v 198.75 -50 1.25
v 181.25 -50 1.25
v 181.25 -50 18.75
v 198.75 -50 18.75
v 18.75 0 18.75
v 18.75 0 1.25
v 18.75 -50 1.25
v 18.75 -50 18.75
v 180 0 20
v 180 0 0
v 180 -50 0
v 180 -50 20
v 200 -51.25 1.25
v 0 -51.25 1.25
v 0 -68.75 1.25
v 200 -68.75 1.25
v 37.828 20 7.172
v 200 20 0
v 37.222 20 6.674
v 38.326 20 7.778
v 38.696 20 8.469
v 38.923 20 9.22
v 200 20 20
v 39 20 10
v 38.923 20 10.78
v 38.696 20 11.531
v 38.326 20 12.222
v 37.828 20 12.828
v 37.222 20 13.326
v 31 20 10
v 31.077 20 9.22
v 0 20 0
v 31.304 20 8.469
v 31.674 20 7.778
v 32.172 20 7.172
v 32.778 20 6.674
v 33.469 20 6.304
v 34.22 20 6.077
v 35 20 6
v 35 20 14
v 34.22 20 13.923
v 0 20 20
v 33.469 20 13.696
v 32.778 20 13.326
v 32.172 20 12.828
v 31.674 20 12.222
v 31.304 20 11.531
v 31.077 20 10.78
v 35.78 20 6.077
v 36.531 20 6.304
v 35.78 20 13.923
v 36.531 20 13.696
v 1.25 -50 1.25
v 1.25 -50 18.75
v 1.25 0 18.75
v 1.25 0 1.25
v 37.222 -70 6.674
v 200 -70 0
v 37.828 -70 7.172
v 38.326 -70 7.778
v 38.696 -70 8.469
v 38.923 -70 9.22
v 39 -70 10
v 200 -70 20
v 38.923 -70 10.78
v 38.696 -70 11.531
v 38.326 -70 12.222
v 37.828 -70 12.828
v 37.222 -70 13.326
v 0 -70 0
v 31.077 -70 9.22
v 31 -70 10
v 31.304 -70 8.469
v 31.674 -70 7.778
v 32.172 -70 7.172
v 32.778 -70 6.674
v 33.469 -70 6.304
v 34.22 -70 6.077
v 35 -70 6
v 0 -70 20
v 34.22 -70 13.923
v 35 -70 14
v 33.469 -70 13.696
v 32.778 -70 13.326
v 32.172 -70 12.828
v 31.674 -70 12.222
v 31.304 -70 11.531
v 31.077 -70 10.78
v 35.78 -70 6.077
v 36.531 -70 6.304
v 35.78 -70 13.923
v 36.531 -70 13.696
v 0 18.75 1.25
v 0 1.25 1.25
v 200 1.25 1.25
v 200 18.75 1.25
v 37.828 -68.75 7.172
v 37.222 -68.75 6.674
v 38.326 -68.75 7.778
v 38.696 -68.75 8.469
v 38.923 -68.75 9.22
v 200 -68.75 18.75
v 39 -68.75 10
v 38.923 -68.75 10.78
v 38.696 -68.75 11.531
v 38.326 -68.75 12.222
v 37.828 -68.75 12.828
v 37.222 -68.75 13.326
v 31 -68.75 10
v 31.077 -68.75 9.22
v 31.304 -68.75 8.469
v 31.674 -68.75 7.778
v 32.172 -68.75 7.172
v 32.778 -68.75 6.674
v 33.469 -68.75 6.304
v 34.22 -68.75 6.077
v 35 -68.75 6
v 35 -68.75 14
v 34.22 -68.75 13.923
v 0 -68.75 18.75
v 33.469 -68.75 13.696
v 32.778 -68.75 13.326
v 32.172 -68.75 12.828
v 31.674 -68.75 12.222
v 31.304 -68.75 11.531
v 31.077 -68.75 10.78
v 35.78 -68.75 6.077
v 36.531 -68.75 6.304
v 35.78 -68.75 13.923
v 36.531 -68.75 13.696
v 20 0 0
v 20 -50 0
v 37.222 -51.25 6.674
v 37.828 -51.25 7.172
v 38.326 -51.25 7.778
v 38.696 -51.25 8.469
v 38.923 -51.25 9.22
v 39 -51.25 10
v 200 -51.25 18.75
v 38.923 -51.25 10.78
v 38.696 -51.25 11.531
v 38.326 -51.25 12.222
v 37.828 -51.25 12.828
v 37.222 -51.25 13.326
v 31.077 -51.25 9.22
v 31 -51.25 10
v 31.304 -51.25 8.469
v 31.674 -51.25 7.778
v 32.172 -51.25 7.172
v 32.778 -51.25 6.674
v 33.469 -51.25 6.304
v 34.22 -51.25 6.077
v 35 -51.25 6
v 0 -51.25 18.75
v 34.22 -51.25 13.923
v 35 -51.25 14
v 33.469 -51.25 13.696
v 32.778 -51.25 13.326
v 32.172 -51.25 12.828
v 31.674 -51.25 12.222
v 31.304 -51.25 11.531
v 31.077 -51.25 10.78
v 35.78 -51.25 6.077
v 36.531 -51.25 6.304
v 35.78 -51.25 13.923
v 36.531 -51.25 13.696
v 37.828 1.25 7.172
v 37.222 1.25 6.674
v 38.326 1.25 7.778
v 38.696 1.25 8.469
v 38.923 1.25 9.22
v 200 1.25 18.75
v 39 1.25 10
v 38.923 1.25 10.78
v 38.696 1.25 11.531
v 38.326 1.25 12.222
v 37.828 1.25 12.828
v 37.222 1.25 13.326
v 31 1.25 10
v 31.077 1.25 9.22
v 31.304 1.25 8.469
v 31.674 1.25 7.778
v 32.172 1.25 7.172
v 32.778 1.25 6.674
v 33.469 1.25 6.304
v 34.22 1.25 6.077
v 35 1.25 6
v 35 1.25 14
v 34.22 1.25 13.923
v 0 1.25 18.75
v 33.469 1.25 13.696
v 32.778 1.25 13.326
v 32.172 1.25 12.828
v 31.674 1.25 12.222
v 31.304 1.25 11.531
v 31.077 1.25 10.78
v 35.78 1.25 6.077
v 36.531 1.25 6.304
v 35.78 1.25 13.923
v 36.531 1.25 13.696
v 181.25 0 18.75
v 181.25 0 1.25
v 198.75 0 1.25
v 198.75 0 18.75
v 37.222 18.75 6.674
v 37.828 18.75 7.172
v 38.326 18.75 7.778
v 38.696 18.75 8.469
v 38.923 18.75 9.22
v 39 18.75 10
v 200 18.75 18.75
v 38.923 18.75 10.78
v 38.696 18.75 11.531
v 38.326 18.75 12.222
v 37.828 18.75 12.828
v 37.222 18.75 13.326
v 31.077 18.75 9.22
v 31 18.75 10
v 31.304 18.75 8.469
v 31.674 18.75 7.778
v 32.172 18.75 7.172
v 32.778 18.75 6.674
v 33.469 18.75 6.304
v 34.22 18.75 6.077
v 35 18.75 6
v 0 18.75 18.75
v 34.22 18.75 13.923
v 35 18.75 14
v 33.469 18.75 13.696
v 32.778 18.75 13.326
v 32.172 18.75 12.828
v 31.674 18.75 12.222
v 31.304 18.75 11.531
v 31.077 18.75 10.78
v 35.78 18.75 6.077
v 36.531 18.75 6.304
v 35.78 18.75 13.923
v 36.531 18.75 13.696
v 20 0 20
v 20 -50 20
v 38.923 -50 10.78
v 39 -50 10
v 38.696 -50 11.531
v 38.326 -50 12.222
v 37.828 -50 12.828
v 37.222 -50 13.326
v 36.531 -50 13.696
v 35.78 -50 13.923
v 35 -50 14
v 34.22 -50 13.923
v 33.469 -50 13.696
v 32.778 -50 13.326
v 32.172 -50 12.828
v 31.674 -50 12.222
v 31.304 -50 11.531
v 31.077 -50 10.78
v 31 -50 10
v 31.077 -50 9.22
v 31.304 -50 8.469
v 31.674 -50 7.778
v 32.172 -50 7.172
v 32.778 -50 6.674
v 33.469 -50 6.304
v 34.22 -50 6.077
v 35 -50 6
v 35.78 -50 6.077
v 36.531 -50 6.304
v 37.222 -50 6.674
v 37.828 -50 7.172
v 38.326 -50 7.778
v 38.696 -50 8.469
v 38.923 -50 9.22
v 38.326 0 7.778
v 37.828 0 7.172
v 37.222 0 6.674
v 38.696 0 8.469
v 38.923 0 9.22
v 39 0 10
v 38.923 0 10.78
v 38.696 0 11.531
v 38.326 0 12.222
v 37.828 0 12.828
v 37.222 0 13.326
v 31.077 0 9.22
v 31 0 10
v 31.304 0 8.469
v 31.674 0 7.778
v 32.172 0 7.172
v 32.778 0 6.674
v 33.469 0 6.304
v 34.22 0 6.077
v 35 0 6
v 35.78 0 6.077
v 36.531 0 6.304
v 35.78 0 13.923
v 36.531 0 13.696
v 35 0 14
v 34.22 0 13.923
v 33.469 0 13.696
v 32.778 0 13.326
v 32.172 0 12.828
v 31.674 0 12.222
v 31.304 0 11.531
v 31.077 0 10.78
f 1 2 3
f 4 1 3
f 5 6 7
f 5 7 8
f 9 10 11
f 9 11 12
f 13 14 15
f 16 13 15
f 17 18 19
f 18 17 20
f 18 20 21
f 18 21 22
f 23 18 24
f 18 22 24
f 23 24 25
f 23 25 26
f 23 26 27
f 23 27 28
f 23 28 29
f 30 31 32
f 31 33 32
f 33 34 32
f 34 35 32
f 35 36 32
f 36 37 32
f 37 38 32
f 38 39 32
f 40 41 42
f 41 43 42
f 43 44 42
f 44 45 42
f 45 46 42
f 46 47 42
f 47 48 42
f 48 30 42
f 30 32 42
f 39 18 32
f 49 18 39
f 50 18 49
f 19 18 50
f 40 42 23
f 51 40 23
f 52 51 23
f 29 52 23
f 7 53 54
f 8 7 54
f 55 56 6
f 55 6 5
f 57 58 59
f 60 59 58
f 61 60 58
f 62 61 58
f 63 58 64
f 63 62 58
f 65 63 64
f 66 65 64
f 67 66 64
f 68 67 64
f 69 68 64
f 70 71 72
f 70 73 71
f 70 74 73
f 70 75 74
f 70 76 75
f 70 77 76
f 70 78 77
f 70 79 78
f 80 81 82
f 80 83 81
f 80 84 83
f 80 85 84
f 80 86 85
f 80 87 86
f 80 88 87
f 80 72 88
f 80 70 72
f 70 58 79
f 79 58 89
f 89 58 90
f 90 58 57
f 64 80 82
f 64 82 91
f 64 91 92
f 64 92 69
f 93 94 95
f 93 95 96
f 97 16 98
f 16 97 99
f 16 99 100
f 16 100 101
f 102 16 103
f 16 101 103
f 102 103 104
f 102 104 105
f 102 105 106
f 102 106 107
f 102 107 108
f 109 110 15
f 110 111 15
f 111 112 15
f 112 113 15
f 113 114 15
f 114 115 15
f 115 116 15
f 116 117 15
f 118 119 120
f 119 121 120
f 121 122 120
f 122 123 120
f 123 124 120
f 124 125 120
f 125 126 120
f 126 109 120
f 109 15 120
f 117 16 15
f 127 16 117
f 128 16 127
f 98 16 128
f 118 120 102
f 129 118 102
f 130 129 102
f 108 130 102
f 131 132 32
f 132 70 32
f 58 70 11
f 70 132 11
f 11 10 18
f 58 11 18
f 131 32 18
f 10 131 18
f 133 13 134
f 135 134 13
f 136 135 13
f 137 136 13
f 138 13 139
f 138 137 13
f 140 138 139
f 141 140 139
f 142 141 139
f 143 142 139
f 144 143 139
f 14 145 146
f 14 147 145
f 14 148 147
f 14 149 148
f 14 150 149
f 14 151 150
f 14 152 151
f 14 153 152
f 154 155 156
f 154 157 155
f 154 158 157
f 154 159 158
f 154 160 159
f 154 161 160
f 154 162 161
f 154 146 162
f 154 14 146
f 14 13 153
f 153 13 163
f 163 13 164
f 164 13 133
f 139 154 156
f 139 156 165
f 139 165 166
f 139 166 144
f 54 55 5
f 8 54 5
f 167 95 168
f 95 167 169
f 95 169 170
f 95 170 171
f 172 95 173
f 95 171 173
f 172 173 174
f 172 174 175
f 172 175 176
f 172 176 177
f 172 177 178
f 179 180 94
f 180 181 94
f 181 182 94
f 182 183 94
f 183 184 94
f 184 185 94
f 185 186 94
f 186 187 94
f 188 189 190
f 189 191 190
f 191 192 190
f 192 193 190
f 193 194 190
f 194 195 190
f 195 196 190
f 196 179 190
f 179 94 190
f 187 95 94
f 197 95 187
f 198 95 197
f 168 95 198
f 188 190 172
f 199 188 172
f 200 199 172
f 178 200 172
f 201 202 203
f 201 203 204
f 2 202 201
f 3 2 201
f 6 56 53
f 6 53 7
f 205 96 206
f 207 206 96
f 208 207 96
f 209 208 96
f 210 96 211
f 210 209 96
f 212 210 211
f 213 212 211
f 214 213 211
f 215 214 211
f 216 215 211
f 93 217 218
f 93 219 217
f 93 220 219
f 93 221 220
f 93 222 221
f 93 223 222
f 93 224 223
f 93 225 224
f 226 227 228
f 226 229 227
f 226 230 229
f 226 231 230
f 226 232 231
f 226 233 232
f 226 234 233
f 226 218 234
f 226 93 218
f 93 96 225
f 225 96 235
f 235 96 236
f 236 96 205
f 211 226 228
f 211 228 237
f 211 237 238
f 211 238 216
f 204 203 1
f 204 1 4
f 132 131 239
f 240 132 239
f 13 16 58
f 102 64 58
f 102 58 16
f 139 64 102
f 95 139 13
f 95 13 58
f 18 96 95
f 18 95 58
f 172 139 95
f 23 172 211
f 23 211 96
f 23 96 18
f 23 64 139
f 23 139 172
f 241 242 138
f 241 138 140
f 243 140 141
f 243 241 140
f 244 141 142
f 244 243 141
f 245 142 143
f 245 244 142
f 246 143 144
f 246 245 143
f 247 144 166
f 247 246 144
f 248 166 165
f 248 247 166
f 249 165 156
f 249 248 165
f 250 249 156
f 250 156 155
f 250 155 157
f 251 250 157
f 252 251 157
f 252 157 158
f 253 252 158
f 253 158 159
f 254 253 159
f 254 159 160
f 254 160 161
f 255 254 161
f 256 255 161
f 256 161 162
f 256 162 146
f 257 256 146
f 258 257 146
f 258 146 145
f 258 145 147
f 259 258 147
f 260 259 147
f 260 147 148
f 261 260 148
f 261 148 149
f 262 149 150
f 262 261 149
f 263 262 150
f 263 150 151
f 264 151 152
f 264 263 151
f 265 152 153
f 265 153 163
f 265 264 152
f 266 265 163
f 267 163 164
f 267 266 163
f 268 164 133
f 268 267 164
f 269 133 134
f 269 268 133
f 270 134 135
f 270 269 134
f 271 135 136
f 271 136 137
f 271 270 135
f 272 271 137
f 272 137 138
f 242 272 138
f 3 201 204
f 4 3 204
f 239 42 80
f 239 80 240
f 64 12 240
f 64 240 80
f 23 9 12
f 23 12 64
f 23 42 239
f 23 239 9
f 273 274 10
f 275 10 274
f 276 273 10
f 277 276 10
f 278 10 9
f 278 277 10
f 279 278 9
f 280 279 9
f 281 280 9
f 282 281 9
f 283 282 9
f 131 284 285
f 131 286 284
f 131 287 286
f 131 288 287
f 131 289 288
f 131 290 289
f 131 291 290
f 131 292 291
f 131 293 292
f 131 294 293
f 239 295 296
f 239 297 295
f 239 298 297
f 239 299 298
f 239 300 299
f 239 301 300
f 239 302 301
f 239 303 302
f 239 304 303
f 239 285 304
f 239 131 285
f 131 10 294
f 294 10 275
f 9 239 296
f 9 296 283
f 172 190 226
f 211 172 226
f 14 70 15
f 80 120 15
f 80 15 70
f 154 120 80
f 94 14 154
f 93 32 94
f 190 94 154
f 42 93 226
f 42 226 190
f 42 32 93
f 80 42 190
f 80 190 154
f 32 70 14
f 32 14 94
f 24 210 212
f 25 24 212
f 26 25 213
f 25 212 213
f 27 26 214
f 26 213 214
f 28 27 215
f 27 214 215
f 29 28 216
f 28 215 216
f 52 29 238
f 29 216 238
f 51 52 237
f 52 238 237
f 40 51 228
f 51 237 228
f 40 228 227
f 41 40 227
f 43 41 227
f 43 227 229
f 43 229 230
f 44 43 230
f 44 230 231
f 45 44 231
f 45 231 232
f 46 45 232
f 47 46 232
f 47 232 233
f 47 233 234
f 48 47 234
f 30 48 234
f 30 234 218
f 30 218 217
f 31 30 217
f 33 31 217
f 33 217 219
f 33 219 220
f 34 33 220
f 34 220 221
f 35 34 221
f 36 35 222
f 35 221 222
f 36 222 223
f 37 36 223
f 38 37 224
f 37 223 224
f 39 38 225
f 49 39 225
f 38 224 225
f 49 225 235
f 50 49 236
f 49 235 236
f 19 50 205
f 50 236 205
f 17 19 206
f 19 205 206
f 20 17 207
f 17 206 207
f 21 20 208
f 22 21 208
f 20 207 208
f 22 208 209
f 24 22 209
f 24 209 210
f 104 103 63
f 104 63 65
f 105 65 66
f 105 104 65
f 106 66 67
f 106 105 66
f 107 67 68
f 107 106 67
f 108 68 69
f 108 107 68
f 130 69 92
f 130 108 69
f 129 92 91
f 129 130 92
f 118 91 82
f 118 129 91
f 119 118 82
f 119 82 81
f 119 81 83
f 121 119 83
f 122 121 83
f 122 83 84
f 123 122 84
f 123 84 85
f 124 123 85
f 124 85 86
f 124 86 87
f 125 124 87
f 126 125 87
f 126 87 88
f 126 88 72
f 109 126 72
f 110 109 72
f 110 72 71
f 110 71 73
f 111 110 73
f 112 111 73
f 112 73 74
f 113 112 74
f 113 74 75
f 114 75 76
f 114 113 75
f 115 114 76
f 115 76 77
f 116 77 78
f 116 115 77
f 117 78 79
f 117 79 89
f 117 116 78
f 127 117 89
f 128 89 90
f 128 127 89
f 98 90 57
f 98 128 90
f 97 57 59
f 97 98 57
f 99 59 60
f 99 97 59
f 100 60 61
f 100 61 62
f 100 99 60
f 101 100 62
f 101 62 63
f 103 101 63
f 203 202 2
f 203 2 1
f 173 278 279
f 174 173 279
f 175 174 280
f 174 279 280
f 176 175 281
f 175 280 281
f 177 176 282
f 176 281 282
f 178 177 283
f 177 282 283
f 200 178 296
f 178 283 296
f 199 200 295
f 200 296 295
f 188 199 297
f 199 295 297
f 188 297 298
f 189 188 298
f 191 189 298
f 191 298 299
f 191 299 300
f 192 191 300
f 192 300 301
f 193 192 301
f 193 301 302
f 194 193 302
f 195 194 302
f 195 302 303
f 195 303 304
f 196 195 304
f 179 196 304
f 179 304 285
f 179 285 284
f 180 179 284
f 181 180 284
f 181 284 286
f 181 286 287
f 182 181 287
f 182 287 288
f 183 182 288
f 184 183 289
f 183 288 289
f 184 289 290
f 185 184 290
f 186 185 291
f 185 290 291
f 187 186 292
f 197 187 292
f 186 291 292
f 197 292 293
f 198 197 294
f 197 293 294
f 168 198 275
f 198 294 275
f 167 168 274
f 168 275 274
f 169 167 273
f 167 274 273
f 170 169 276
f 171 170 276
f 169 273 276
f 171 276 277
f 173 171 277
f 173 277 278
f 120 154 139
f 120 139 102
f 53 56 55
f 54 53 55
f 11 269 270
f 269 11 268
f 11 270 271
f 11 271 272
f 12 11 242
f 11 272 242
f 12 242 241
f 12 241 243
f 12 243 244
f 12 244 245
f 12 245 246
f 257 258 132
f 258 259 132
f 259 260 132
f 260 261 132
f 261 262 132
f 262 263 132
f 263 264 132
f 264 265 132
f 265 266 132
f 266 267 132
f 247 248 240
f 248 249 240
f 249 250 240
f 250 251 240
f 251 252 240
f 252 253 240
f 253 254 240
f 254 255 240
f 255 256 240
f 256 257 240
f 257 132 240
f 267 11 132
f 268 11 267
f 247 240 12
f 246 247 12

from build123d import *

# Parameters (mm, degrees)
F0_W     = 20
F0_H     = 20
F0_W_2   = 17.5
F0_H_2   = 17.5
F1_DEPTH = 200
F2_W     = 20
F2_H     = 20
F2_W_2   = 17.5
F2_H_2   = 17.5
F3_DEPTH = 50
F4_R     = 4
F5_DEPTH = 20.001


with BuildPart() as f1:
    # F0 (on Right) → F1 (new body)
    with BuildSketch(Plane.YZ):
        with Locations((10, 10)):
            Rectangle(F0_W, F0_H)
        with Locations((10, 10)):
            Rectangle(F0_W_2, F0_H_2, mode=Mode.SUBTRACT)
    extrude(amount=F1_DEPTH)

    # F2 (on face) → F3 (join)
    with BuildSketch(Plane.XZ):
        with Locations((10, 10)):
            Rectangle(F2_W, F2_H)
        with Locations((10, 10)):
            Rectangle(F2_W_2, F2_H_2, mode=Mode.SUBTRACT)
        with Locations((190, 10)):
            Rectangle(F2_W, F2_H)
        with Locations((190, 10)):
            Rectangle(F2_W_2, F2_H_2, mode=Mode.SUBTRACT)
    extrude(amount=F3_DEPTH)

    # F4 (on face) → F5 (cut, through all)
    with BuildSketch(Plane.XZ):
        with Locations((35, 10)):
            Circle(F4_R)
    extrude(amount=-F5_DEPTH, mode=Mode.SUBTRACT)

    # F8: F1 across plane


with BuildPart() as f1_1:
    add(f1.part)
    add(f1.part.mirror(Plane.XZ.offset(25)))


solid = f1_1.part
